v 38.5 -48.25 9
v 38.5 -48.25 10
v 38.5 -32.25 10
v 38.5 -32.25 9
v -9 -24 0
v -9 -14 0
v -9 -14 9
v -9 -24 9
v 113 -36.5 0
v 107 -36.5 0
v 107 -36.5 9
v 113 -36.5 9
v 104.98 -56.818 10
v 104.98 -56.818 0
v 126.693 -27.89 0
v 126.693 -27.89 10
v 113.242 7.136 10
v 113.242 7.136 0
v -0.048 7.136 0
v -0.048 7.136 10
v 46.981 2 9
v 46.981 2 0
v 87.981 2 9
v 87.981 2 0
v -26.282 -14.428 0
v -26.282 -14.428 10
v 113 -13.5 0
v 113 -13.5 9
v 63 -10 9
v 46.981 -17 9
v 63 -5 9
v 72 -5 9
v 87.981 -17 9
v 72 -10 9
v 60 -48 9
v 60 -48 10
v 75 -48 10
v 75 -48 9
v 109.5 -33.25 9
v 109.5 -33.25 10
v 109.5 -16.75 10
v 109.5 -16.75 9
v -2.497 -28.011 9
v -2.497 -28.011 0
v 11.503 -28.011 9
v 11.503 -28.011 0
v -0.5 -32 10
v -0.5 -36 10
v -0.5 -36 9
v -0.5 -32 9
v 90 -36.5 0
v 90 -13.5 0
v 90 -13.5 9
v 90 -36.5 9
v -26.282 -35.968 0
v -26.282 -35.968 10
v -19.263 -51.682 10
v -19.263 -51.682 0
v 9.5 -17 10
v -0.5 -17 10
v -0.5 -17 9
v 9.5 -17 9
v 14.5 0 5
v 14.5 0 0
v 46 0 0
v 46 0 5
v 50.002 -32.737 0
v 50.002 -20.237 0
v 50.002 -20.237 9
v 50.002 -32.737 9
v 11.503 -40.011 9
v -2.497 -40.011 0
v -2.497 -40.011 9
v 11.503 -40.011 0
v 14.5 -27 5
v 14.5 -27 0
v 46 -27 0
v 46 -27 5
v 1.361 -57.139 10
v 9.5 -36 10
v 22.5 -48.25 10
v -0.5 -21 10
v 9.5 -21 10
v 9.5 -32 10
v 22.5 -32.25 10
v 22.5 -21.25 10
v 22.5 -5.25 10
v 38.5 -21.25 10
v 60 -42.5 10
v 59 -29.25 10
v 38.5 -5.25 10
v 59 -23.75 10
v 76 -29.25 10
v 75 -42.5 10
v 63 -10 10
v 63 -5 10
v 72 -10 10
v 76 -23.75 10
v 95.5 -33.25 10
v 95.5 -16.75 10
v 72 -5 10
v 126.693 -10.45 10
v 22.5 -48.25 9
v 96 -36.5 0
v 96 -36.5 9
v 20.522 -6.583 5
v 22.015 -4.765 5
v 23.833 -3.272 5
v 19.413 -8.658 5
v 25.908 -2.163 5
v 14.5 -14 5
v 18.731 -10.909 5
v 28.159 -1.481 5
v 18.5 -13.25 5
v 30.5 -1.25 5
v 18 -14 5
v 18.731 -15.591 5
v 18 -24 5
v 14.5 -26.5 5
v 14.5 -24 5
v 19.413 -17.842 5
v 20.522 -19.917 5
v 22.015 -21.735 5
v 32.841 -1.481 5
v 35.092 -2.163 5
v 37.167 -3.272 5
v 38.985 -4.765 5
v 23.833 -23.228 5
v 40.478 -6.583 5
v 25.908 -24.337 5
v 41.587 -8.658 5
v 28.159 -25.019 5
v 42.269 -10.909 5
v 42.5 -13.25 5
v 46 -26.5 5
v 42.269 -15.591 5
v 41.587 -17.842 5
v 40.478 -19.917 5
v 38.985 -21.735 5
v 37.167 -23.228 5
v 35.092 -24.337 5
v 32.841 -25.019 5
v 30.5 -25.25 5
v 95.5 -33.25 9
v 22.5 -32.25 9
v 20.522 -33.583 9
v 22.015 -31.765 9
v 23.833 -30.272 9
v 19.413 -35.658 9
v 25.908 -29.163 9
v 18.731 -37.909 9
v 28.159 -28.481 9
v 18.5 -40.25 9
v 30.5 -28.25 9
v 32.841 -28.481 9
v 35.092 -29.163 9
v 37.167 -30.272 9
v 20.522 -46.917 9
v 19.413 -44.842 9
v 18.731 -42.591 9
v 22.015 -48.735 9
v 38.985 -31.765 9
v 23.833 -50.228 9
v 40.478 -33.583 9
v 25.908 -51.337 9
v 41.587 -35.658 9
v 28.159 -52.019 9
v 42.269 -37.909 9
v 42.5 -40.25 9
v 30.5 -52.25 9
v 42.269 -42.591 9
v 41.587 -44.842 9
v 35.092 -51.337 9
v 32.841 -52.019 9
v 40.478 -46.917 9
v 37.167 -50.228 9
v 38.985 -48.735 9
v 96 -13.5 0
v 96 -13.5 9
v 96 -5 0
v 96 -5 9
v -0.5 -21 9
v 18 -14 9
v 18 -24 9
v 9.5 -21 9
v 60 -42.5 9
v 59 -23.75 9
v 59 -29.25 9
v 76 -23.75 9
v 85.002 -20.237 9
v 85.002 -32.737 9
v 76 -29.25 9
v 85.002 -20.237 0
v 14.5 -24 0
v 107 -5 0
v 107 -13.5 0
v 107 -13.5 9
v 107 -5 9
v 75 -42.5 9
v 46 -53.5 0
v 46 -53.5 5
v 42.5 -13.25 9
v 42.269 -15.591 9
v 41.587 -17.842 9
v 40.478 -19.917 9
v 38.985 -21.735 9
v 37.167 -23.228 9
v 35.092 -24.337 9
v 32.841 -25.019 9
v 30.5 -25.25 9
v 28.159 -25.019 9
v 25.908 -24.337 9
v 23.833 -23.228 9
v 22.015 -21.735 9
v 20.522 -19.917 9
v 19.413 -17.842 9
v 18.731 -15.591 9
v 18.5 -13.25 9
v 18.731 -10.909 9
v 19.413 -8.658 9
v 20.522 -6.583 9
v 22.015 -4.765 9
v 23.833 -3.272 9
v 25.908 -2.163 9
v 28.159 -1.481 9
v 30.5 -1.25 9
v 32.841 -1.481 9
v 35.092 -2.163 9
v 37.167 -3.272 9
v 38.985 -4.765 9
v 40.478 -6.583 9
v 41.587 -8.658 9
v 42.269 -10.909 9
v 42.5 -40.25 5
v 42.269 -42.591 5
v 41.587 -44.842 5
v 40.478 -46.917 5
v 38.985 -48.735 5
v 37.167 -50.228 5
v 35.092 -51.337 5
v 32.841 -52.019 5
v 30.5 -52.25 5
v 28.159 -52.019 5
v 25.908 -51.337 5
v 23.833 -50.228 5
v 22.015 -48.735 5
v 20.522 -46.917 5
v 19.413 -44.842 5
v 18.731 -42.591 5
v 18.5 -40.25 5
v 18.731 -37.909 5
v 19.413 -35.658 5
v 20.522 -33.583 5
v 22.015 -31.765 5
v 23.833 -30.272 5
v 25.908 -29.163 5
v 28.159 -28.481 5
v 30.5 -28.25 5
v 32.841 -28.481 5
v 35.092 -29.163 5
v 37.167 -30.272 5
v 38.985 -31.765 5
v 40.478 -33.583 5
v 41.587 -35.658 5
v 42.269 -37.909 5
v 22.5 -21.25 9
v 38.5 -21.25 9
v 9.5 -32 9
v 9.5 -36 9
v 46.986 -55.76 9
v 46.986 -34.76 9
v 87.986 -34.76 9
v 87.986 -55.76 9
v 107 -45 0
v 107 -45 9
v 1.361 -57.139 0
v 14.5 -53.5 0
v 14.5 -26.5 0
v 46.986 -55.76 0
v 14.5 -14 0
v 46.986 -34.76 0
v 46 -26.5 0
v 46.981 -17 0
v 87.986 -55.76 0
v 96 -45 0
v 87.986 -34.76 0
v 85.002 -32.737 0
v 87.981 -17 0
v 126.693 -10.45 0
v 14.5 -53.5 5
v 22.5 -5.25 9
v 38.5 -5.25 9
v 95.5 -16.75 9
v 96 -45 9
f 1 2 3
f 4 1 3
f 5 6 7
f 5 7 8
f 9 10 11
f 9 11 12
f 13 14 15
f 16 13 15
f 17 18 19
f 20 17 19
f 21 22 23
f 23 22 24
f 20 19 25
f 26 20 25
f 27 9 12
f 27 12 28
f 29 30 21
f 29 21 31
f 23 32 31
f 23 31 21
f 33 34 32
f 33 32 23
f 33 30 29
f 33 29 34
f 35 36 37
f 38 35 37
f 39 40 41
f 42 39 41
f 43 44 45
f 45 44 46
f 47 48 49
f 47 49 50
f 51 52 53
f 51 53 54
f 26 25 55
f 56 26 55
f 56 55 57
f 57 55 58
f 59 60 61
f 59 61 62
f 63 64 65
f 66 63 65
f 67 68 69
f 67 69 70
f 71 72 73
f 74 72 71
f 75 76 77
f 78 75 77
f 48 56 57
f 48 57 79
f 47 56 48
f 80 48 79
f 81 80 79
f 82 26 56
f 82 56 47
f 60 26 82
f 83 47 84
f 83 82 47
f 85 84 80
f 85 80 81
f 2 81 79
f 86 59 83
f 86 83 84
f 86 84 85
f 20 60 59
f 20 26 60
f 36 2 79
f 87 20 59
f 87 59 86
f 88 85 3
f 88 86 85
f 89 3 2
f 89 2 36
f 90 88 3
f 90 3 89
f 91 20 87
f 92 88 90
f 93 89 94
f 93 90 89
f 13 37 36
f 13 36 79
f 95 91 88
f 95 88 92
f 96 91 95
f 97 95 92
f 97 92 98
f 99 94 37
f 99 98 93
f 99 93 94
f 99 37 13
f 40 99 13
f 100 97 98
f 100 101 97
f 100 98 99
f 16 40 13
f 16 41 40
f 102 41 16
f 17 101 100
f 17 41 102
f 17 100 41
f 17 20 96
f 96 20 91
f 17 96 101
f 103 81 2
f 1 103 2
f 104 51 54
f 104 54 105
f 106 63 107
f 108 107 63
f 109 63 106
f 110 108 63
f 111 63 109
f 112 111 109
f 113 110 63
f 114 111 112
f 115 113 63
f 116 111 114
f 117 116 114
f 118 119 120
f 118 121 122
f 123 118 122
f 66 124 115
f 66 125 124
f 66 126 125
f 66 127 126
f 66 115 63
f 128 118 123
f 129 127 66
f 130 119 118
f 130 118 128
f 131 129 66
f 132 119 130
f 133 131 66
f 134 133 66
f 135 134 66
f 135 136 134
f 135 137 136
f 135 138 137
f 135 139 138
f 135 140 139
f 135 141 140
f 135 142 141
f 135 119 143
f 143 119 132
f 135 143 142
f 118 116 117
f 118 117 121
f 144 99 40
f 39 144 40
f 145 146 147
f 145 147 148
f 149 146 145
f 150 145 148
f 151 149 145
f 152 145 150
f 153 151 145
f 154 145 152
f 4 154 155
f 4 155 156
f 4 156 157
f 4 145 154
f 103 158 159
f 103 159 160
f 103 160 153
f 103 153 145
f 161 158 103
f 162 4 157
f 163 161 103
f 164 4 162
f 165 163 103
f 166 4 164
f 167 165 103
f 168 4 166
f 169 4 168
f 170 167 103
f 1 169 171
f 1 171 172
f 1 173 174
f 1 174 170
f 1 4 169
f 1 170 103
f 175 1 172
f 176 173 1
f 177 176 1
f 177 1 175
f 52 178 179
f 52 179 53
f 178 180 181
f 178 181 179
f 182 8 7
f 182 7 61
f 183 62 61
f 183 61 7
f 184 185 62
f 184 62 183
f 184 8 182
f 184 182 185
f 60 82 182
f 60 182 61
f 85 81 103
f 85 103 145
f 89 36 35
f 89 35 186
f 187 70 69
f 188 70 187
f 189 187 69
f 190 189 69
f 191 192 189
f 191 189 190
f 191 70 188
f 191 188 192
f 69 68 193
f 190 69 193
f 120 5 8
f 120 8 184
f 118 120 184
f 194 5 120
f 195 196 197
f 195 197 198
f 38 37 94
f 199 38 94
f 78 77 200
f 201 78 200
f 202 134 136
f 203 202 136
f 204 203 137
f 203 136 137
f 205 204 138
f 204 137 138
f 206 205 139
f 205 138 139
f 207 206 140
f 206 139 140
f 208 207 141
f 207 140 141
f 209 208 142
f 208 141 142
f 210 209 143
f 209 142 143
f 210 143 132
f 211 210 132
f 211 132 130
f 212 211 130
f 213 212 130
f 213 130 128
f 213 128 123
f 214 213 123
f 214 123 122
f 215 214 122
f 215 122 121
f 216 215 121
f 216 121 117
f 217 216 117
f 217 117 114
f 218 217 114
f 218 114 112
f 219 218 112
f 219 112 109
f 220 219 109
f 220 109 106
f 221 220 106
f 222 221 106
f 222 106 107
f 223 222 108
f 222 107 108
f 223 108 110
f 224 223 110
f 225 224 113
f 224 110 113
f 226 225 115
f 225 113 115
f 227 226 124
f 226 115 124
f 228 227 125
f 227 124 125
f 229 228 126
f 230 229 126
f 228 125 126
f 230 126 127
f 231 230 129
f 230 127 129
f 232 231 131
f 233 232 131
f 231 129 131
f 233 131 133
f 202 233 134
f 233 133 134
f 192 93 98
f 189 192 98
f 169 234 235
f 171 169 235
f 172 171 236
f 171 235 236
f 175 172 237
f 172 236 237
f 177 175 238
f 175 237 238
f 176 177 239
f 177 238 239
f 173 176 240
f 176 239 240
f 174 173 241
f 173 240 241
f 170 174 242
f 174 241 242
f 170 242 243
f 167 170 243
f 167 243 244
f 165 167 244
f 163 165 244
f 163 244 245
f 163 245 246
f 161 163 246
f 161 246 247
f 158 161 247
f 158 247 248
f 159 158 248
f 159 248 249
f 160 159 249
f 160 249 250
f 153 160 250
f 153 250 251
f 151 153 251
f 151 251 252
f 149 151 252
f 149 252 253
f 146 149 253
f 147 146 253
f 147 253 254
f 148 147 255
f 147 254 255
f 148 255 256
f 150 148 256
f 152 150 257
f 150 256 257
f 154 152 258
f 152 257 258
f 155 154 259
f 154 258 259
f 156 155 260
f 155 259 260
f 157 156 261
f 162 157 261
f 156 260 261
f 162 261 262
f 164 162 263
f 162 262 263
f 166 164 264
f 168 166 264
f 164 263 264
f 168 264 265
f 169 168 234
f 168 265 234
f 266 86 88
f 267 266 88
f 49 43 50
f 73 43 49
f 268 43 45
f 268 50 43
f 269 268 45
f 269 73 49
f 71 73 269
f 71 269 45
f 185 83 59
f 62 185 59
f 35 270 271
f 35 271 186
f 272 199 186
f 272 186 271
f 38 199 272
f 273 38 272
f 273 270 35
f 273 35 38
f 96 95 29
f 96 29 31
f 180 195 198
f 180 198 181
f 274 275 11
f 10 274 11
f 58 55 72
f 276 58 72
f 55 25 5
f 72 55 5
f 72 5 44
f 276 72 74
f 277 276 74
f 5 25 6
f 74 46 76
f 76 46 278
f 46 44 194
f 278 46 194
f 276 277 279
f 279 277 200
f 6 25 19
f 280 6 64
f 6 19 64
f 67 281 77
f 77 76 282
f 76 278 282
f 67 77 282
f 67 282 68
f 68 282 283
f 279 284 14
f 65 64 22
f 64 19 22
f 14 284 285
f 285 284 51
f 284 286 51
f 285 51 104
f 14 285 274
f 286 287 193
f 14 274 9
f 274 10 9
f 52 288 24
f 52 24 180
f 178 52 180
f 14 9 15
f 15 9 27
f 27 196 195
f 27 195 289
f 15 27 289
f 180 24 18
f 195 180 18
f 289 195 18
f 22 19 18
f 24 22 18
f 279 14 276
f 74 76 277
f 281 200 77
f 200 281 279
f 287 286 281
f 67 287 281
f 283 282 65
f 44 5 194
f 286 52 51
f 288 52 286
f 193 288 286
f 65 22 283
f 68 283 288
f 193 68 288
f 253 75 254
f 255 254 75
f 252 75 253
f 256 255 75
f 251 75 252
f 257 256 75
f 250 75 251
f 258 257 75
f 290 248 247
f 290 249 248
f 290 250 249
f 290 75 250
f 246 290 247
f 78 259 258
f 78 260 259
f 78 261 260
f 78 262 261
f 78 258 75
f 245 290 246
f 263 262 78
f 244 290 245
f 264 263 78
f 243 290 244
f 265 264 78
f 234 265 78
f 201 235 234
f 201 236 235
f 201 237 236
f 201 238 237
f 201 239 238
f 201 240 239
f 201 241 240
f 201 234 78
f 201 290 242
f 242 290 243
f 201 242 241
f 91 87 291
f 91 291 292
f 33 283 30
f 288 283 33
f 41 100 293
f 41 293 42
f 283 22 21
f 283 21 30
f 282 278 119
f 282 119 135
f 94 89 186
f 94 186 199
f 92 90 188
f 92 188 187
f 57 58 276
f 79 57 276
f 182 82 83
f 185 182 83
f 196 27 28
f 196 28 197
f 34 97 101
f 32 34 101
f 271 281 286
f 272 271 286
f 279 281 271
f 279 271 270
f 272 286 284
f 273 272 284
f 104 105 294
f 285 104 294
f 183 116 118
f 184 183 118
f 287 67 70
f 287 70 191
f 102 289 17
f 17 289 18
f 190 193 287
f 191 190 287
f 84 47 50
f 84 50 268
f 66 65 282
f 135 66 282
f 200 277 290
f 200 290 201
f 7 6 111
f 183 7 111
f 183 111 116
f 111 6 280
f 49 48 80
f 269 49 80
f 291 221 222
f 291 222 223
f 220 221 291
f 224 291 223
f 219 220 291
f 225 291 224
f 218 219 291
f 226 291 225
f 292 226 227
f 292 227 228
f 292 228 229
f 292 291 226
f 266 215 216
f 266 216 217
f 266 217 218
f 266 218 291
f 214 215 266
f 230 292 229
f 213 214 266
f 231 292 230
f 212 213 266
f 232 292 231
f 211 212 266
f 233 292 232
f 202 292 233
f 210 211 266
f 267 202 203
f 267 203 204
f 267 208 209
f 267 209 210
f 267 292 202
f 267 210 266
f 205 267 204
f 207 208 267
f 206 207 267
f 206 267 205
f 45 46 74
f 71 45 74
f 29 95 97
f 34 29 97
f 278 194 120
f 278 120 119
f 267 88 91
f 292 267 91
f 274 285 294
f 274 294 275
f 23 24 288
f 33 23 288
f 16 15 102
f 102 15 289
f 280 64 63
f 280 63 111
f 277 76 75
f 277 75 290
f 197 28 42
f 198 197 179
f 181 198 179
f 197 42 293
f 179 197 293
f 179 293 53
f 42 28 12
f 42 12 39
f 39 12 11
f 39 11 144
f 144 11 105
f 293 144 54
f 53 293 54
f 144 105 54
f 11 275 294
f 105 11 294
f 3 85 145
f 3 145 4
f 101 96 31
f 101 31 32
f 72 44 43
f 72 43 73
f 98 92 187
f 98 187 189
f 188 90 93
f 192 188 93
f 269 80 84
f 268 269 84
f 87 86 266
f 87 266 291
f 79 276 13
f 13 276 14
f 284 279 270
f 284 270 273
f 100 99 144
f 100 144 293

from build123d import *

# Parameters (mm, degrees)
PAD_DEPTH       = 10
SKETCH001_W     = 10
SKETCH001_H     = 4
SKETCH001_W_2   = 15
SKETCH001_H_2   = 5.5
SKETCH001_W_3   = 9
SKETCH001_H_3   = 5
SKETCH001_W_4   = 14
SKETCH001_H_4   = 16.5
SKETCH001_W_5   = 16
SKETCH001_H_5   = 16
SKETCH001_W_6   = 17
POCKET_DEPTH    = 1
SKETCH002_R     = 12
POCKET001_DEPTH = 9
SKETCH003_W     = 41
SKETCH003_H     = 19
POCKET002_DEPTH = 9
SKETCH004_W     = 35
SKETCH004_H     = 12.5
POCKET003_DEPTH = 9
SKETCH005_W     = 41
SKETCH005_H     = 21
POCKET004_DEPTH = 9
SKETCH006_W     = 14
SKETCH006_H     = 12
POCKET005_DEPTH = 9
POCKET006_DEPTH = 9
SKETCH010_W     = 31.5
SKETCH010_H     = 26.5
POCKET007_DEPTH = 5
SKETCH011_W     = 27
SKETCH011_H     = 10
POCKET008_DEPTH = 9


with BuildPart() as part:
    # Sketch → Pad (new body)
    with BuildSketch(Plane.XY):
        Polygon((113.242246, 7.136342), (-0.047754, 7.136342), (-26.28226, -14.428265), (-26.28226, -35.968265), (-19.26312, -51.681819), (1.360962, -57.138638), (104.980466, -56.818034), (126.692617, -27.88965), (126.692617, -10.44965), align=None)
    extrude(amount=PAD_DEPTH)

    # Sketch001 (on Face11 of Pad) → Pocket (cut)
    with BuildSketch(Plane.XY.offset(10)):
        with Locations((4.5, -19)):
            Rectangle(SKETCH001_W, SKETCH001_H)
        with Locations((4.5, -34)):
            Rectangle(SKETCH001_W, SKETCH001_H)
        with Locations((67.5, -45.25)):
            Rectangle(SKETCH001_W_2, SKETCH001_H_2)
        with Locations((67.5, -7.5)):
            Rectangle(SKETCH001_W_3, SKETCH001_H_3)
        with Locations((102.5, -25)):
            Rectangle(SKETCH001_W_4, SKETCH001_H_4)
        with Locations((30.5, -13.25)):
            Rectangle(SKETCH001_W_5, SKETCH001_H_5)
        with Locations((30.5, -40.25)):
            Rectangle(SKETCH001_W_5, SKETCH001_H_5)
        with Locations((67.5, -26.5)):
            Rectangle(SKETCH001_W_6, SKETCH001_H_2)
    extrude(amount=-POCKET_DEPTH, mode=Mode.SUBTRACT)

    # Sketch002 (on Face4 of Pocket) → Pocket001 (cut)
    with BuildSketch(Plane(origin=(0, 0, 0), x_dir=(1, 0, 0), z_dir=(0, 0, -1))):
        with Locations((30.5, 40.25)):
            Circle(SKETCH002_R)
        with Locations((30.5, 13.25)):
            Circle(SKETCH002_R)
    extrude(amount=-POCKET001_DEPTH, mode=Mode.SUBTRACT)

    # Sketch003 (on Face4 of Pocket001) → Pocket002 (cut)
    with BuildSketch(Plane(origin=(0, 0, 0), x_dir=(1, 0, 0), z_dir=(0, 0, -1))):
        with Locations((67.481461, 7.5)):
            Rectangle(SKETCH003_W, SKETCH003_H)
    extrude(amount=-POCKET002_DEPTH, mode=Mode.SUBTRACT)

    # Sketch004 (on Face4 of Pocket002) → Pocket003 (cut)
    with BuildSketch(Plane(origin=(0, 0, 0), x_dir=(1, 0, 0), z_dir=(0, 0, -1))):
        with Locations((67.501572, 26.486867)):
            Rectangle(SKETCH004_W, SKETCH004_H)
    extrude(amount=-POCKET003_DEPTH, mode=Mode.SUBTRACT)

    # Sketch005 (on Face4 of Pocket003) → Pocket004 (cut)
    with BuildSketch(Plane(origin=(0, 0, 0), x_dir=(1, 0, 0), z_dir=(0, 0, -1))):
        with Locations((67.486454, 45.259564)):
            Rectangle(SKETCH005_W, SKETCH005_H)
    extrude(amount=-POCKET004_DEPTH, mode=Mode.SUBTRACT)

    # Sketch006 (on Face4 of Pocket004) → Pocket005 (cut)
    with BuildSketch(Plane(origin=(0, 0, 0), x_dir=(1, 0, 0), z_dir=(0, 0, -1))):
        with Locations((4.502728, 34.011238)):
            Rectangle(SKETCH006_W, SKETCH006_H)
    extrude(amount=-POCKET005_DEPTH, mode=Mode.SUBTRACT)

    # Sketch009 (on Face4 of Pocket005) → Pocket006 (cut)
    with BuildSketch(Plane(origin=(0, 0, 0), x_dir=(1, 0, 0), z_dir=(0, 0, -1))):
        Polygon((90, 36.5), (96, 36.5), (96, 45), (107, 45), (107, 36.5), (113, 36.5), (113, 13.5), (107, 13.5), (107, 5), (96, 5), (96, 13.5), (90, 13.5), align=None)
    extrude(amount=-POCKET006_DEPTH, mode=Mode.SUBTRACT)

    # Sketch010 (on Face4 of Pocket005) → Pocket007 (cut)
    with BuildSketch(Plane(origin=(0, 0, 0), x_dir=(1, 0, 0), z_dir=(0, 0, -1))):
        with Locations((30.25, 40.25)):
            Rectangle(SKETCH010_W, SKETCH010_H)
        with Locations((30.25, 13.25)):
            Rectangle(SKETCH010_W, SKETCH010_H)
    extrude(amount=-POCKET007_DEPTH, mode=Mode.SUBTRACT)

    # Sketch011 (on Face4 of Pocket007) → Pocket008 (cut)
    with BuildSketch(Plane(origin=(0, 0, 0), x_dir=(1, 0, 0), z_dir=(0, 0, -1))):
        with Locations((4.5, 19)):
            Rectangle(SKETCH011_W, SKETCH011_H)
    extrude(amount=-POCKET008_DEPTH, mode=Mode.SUBTRACT)


solid = part.part
